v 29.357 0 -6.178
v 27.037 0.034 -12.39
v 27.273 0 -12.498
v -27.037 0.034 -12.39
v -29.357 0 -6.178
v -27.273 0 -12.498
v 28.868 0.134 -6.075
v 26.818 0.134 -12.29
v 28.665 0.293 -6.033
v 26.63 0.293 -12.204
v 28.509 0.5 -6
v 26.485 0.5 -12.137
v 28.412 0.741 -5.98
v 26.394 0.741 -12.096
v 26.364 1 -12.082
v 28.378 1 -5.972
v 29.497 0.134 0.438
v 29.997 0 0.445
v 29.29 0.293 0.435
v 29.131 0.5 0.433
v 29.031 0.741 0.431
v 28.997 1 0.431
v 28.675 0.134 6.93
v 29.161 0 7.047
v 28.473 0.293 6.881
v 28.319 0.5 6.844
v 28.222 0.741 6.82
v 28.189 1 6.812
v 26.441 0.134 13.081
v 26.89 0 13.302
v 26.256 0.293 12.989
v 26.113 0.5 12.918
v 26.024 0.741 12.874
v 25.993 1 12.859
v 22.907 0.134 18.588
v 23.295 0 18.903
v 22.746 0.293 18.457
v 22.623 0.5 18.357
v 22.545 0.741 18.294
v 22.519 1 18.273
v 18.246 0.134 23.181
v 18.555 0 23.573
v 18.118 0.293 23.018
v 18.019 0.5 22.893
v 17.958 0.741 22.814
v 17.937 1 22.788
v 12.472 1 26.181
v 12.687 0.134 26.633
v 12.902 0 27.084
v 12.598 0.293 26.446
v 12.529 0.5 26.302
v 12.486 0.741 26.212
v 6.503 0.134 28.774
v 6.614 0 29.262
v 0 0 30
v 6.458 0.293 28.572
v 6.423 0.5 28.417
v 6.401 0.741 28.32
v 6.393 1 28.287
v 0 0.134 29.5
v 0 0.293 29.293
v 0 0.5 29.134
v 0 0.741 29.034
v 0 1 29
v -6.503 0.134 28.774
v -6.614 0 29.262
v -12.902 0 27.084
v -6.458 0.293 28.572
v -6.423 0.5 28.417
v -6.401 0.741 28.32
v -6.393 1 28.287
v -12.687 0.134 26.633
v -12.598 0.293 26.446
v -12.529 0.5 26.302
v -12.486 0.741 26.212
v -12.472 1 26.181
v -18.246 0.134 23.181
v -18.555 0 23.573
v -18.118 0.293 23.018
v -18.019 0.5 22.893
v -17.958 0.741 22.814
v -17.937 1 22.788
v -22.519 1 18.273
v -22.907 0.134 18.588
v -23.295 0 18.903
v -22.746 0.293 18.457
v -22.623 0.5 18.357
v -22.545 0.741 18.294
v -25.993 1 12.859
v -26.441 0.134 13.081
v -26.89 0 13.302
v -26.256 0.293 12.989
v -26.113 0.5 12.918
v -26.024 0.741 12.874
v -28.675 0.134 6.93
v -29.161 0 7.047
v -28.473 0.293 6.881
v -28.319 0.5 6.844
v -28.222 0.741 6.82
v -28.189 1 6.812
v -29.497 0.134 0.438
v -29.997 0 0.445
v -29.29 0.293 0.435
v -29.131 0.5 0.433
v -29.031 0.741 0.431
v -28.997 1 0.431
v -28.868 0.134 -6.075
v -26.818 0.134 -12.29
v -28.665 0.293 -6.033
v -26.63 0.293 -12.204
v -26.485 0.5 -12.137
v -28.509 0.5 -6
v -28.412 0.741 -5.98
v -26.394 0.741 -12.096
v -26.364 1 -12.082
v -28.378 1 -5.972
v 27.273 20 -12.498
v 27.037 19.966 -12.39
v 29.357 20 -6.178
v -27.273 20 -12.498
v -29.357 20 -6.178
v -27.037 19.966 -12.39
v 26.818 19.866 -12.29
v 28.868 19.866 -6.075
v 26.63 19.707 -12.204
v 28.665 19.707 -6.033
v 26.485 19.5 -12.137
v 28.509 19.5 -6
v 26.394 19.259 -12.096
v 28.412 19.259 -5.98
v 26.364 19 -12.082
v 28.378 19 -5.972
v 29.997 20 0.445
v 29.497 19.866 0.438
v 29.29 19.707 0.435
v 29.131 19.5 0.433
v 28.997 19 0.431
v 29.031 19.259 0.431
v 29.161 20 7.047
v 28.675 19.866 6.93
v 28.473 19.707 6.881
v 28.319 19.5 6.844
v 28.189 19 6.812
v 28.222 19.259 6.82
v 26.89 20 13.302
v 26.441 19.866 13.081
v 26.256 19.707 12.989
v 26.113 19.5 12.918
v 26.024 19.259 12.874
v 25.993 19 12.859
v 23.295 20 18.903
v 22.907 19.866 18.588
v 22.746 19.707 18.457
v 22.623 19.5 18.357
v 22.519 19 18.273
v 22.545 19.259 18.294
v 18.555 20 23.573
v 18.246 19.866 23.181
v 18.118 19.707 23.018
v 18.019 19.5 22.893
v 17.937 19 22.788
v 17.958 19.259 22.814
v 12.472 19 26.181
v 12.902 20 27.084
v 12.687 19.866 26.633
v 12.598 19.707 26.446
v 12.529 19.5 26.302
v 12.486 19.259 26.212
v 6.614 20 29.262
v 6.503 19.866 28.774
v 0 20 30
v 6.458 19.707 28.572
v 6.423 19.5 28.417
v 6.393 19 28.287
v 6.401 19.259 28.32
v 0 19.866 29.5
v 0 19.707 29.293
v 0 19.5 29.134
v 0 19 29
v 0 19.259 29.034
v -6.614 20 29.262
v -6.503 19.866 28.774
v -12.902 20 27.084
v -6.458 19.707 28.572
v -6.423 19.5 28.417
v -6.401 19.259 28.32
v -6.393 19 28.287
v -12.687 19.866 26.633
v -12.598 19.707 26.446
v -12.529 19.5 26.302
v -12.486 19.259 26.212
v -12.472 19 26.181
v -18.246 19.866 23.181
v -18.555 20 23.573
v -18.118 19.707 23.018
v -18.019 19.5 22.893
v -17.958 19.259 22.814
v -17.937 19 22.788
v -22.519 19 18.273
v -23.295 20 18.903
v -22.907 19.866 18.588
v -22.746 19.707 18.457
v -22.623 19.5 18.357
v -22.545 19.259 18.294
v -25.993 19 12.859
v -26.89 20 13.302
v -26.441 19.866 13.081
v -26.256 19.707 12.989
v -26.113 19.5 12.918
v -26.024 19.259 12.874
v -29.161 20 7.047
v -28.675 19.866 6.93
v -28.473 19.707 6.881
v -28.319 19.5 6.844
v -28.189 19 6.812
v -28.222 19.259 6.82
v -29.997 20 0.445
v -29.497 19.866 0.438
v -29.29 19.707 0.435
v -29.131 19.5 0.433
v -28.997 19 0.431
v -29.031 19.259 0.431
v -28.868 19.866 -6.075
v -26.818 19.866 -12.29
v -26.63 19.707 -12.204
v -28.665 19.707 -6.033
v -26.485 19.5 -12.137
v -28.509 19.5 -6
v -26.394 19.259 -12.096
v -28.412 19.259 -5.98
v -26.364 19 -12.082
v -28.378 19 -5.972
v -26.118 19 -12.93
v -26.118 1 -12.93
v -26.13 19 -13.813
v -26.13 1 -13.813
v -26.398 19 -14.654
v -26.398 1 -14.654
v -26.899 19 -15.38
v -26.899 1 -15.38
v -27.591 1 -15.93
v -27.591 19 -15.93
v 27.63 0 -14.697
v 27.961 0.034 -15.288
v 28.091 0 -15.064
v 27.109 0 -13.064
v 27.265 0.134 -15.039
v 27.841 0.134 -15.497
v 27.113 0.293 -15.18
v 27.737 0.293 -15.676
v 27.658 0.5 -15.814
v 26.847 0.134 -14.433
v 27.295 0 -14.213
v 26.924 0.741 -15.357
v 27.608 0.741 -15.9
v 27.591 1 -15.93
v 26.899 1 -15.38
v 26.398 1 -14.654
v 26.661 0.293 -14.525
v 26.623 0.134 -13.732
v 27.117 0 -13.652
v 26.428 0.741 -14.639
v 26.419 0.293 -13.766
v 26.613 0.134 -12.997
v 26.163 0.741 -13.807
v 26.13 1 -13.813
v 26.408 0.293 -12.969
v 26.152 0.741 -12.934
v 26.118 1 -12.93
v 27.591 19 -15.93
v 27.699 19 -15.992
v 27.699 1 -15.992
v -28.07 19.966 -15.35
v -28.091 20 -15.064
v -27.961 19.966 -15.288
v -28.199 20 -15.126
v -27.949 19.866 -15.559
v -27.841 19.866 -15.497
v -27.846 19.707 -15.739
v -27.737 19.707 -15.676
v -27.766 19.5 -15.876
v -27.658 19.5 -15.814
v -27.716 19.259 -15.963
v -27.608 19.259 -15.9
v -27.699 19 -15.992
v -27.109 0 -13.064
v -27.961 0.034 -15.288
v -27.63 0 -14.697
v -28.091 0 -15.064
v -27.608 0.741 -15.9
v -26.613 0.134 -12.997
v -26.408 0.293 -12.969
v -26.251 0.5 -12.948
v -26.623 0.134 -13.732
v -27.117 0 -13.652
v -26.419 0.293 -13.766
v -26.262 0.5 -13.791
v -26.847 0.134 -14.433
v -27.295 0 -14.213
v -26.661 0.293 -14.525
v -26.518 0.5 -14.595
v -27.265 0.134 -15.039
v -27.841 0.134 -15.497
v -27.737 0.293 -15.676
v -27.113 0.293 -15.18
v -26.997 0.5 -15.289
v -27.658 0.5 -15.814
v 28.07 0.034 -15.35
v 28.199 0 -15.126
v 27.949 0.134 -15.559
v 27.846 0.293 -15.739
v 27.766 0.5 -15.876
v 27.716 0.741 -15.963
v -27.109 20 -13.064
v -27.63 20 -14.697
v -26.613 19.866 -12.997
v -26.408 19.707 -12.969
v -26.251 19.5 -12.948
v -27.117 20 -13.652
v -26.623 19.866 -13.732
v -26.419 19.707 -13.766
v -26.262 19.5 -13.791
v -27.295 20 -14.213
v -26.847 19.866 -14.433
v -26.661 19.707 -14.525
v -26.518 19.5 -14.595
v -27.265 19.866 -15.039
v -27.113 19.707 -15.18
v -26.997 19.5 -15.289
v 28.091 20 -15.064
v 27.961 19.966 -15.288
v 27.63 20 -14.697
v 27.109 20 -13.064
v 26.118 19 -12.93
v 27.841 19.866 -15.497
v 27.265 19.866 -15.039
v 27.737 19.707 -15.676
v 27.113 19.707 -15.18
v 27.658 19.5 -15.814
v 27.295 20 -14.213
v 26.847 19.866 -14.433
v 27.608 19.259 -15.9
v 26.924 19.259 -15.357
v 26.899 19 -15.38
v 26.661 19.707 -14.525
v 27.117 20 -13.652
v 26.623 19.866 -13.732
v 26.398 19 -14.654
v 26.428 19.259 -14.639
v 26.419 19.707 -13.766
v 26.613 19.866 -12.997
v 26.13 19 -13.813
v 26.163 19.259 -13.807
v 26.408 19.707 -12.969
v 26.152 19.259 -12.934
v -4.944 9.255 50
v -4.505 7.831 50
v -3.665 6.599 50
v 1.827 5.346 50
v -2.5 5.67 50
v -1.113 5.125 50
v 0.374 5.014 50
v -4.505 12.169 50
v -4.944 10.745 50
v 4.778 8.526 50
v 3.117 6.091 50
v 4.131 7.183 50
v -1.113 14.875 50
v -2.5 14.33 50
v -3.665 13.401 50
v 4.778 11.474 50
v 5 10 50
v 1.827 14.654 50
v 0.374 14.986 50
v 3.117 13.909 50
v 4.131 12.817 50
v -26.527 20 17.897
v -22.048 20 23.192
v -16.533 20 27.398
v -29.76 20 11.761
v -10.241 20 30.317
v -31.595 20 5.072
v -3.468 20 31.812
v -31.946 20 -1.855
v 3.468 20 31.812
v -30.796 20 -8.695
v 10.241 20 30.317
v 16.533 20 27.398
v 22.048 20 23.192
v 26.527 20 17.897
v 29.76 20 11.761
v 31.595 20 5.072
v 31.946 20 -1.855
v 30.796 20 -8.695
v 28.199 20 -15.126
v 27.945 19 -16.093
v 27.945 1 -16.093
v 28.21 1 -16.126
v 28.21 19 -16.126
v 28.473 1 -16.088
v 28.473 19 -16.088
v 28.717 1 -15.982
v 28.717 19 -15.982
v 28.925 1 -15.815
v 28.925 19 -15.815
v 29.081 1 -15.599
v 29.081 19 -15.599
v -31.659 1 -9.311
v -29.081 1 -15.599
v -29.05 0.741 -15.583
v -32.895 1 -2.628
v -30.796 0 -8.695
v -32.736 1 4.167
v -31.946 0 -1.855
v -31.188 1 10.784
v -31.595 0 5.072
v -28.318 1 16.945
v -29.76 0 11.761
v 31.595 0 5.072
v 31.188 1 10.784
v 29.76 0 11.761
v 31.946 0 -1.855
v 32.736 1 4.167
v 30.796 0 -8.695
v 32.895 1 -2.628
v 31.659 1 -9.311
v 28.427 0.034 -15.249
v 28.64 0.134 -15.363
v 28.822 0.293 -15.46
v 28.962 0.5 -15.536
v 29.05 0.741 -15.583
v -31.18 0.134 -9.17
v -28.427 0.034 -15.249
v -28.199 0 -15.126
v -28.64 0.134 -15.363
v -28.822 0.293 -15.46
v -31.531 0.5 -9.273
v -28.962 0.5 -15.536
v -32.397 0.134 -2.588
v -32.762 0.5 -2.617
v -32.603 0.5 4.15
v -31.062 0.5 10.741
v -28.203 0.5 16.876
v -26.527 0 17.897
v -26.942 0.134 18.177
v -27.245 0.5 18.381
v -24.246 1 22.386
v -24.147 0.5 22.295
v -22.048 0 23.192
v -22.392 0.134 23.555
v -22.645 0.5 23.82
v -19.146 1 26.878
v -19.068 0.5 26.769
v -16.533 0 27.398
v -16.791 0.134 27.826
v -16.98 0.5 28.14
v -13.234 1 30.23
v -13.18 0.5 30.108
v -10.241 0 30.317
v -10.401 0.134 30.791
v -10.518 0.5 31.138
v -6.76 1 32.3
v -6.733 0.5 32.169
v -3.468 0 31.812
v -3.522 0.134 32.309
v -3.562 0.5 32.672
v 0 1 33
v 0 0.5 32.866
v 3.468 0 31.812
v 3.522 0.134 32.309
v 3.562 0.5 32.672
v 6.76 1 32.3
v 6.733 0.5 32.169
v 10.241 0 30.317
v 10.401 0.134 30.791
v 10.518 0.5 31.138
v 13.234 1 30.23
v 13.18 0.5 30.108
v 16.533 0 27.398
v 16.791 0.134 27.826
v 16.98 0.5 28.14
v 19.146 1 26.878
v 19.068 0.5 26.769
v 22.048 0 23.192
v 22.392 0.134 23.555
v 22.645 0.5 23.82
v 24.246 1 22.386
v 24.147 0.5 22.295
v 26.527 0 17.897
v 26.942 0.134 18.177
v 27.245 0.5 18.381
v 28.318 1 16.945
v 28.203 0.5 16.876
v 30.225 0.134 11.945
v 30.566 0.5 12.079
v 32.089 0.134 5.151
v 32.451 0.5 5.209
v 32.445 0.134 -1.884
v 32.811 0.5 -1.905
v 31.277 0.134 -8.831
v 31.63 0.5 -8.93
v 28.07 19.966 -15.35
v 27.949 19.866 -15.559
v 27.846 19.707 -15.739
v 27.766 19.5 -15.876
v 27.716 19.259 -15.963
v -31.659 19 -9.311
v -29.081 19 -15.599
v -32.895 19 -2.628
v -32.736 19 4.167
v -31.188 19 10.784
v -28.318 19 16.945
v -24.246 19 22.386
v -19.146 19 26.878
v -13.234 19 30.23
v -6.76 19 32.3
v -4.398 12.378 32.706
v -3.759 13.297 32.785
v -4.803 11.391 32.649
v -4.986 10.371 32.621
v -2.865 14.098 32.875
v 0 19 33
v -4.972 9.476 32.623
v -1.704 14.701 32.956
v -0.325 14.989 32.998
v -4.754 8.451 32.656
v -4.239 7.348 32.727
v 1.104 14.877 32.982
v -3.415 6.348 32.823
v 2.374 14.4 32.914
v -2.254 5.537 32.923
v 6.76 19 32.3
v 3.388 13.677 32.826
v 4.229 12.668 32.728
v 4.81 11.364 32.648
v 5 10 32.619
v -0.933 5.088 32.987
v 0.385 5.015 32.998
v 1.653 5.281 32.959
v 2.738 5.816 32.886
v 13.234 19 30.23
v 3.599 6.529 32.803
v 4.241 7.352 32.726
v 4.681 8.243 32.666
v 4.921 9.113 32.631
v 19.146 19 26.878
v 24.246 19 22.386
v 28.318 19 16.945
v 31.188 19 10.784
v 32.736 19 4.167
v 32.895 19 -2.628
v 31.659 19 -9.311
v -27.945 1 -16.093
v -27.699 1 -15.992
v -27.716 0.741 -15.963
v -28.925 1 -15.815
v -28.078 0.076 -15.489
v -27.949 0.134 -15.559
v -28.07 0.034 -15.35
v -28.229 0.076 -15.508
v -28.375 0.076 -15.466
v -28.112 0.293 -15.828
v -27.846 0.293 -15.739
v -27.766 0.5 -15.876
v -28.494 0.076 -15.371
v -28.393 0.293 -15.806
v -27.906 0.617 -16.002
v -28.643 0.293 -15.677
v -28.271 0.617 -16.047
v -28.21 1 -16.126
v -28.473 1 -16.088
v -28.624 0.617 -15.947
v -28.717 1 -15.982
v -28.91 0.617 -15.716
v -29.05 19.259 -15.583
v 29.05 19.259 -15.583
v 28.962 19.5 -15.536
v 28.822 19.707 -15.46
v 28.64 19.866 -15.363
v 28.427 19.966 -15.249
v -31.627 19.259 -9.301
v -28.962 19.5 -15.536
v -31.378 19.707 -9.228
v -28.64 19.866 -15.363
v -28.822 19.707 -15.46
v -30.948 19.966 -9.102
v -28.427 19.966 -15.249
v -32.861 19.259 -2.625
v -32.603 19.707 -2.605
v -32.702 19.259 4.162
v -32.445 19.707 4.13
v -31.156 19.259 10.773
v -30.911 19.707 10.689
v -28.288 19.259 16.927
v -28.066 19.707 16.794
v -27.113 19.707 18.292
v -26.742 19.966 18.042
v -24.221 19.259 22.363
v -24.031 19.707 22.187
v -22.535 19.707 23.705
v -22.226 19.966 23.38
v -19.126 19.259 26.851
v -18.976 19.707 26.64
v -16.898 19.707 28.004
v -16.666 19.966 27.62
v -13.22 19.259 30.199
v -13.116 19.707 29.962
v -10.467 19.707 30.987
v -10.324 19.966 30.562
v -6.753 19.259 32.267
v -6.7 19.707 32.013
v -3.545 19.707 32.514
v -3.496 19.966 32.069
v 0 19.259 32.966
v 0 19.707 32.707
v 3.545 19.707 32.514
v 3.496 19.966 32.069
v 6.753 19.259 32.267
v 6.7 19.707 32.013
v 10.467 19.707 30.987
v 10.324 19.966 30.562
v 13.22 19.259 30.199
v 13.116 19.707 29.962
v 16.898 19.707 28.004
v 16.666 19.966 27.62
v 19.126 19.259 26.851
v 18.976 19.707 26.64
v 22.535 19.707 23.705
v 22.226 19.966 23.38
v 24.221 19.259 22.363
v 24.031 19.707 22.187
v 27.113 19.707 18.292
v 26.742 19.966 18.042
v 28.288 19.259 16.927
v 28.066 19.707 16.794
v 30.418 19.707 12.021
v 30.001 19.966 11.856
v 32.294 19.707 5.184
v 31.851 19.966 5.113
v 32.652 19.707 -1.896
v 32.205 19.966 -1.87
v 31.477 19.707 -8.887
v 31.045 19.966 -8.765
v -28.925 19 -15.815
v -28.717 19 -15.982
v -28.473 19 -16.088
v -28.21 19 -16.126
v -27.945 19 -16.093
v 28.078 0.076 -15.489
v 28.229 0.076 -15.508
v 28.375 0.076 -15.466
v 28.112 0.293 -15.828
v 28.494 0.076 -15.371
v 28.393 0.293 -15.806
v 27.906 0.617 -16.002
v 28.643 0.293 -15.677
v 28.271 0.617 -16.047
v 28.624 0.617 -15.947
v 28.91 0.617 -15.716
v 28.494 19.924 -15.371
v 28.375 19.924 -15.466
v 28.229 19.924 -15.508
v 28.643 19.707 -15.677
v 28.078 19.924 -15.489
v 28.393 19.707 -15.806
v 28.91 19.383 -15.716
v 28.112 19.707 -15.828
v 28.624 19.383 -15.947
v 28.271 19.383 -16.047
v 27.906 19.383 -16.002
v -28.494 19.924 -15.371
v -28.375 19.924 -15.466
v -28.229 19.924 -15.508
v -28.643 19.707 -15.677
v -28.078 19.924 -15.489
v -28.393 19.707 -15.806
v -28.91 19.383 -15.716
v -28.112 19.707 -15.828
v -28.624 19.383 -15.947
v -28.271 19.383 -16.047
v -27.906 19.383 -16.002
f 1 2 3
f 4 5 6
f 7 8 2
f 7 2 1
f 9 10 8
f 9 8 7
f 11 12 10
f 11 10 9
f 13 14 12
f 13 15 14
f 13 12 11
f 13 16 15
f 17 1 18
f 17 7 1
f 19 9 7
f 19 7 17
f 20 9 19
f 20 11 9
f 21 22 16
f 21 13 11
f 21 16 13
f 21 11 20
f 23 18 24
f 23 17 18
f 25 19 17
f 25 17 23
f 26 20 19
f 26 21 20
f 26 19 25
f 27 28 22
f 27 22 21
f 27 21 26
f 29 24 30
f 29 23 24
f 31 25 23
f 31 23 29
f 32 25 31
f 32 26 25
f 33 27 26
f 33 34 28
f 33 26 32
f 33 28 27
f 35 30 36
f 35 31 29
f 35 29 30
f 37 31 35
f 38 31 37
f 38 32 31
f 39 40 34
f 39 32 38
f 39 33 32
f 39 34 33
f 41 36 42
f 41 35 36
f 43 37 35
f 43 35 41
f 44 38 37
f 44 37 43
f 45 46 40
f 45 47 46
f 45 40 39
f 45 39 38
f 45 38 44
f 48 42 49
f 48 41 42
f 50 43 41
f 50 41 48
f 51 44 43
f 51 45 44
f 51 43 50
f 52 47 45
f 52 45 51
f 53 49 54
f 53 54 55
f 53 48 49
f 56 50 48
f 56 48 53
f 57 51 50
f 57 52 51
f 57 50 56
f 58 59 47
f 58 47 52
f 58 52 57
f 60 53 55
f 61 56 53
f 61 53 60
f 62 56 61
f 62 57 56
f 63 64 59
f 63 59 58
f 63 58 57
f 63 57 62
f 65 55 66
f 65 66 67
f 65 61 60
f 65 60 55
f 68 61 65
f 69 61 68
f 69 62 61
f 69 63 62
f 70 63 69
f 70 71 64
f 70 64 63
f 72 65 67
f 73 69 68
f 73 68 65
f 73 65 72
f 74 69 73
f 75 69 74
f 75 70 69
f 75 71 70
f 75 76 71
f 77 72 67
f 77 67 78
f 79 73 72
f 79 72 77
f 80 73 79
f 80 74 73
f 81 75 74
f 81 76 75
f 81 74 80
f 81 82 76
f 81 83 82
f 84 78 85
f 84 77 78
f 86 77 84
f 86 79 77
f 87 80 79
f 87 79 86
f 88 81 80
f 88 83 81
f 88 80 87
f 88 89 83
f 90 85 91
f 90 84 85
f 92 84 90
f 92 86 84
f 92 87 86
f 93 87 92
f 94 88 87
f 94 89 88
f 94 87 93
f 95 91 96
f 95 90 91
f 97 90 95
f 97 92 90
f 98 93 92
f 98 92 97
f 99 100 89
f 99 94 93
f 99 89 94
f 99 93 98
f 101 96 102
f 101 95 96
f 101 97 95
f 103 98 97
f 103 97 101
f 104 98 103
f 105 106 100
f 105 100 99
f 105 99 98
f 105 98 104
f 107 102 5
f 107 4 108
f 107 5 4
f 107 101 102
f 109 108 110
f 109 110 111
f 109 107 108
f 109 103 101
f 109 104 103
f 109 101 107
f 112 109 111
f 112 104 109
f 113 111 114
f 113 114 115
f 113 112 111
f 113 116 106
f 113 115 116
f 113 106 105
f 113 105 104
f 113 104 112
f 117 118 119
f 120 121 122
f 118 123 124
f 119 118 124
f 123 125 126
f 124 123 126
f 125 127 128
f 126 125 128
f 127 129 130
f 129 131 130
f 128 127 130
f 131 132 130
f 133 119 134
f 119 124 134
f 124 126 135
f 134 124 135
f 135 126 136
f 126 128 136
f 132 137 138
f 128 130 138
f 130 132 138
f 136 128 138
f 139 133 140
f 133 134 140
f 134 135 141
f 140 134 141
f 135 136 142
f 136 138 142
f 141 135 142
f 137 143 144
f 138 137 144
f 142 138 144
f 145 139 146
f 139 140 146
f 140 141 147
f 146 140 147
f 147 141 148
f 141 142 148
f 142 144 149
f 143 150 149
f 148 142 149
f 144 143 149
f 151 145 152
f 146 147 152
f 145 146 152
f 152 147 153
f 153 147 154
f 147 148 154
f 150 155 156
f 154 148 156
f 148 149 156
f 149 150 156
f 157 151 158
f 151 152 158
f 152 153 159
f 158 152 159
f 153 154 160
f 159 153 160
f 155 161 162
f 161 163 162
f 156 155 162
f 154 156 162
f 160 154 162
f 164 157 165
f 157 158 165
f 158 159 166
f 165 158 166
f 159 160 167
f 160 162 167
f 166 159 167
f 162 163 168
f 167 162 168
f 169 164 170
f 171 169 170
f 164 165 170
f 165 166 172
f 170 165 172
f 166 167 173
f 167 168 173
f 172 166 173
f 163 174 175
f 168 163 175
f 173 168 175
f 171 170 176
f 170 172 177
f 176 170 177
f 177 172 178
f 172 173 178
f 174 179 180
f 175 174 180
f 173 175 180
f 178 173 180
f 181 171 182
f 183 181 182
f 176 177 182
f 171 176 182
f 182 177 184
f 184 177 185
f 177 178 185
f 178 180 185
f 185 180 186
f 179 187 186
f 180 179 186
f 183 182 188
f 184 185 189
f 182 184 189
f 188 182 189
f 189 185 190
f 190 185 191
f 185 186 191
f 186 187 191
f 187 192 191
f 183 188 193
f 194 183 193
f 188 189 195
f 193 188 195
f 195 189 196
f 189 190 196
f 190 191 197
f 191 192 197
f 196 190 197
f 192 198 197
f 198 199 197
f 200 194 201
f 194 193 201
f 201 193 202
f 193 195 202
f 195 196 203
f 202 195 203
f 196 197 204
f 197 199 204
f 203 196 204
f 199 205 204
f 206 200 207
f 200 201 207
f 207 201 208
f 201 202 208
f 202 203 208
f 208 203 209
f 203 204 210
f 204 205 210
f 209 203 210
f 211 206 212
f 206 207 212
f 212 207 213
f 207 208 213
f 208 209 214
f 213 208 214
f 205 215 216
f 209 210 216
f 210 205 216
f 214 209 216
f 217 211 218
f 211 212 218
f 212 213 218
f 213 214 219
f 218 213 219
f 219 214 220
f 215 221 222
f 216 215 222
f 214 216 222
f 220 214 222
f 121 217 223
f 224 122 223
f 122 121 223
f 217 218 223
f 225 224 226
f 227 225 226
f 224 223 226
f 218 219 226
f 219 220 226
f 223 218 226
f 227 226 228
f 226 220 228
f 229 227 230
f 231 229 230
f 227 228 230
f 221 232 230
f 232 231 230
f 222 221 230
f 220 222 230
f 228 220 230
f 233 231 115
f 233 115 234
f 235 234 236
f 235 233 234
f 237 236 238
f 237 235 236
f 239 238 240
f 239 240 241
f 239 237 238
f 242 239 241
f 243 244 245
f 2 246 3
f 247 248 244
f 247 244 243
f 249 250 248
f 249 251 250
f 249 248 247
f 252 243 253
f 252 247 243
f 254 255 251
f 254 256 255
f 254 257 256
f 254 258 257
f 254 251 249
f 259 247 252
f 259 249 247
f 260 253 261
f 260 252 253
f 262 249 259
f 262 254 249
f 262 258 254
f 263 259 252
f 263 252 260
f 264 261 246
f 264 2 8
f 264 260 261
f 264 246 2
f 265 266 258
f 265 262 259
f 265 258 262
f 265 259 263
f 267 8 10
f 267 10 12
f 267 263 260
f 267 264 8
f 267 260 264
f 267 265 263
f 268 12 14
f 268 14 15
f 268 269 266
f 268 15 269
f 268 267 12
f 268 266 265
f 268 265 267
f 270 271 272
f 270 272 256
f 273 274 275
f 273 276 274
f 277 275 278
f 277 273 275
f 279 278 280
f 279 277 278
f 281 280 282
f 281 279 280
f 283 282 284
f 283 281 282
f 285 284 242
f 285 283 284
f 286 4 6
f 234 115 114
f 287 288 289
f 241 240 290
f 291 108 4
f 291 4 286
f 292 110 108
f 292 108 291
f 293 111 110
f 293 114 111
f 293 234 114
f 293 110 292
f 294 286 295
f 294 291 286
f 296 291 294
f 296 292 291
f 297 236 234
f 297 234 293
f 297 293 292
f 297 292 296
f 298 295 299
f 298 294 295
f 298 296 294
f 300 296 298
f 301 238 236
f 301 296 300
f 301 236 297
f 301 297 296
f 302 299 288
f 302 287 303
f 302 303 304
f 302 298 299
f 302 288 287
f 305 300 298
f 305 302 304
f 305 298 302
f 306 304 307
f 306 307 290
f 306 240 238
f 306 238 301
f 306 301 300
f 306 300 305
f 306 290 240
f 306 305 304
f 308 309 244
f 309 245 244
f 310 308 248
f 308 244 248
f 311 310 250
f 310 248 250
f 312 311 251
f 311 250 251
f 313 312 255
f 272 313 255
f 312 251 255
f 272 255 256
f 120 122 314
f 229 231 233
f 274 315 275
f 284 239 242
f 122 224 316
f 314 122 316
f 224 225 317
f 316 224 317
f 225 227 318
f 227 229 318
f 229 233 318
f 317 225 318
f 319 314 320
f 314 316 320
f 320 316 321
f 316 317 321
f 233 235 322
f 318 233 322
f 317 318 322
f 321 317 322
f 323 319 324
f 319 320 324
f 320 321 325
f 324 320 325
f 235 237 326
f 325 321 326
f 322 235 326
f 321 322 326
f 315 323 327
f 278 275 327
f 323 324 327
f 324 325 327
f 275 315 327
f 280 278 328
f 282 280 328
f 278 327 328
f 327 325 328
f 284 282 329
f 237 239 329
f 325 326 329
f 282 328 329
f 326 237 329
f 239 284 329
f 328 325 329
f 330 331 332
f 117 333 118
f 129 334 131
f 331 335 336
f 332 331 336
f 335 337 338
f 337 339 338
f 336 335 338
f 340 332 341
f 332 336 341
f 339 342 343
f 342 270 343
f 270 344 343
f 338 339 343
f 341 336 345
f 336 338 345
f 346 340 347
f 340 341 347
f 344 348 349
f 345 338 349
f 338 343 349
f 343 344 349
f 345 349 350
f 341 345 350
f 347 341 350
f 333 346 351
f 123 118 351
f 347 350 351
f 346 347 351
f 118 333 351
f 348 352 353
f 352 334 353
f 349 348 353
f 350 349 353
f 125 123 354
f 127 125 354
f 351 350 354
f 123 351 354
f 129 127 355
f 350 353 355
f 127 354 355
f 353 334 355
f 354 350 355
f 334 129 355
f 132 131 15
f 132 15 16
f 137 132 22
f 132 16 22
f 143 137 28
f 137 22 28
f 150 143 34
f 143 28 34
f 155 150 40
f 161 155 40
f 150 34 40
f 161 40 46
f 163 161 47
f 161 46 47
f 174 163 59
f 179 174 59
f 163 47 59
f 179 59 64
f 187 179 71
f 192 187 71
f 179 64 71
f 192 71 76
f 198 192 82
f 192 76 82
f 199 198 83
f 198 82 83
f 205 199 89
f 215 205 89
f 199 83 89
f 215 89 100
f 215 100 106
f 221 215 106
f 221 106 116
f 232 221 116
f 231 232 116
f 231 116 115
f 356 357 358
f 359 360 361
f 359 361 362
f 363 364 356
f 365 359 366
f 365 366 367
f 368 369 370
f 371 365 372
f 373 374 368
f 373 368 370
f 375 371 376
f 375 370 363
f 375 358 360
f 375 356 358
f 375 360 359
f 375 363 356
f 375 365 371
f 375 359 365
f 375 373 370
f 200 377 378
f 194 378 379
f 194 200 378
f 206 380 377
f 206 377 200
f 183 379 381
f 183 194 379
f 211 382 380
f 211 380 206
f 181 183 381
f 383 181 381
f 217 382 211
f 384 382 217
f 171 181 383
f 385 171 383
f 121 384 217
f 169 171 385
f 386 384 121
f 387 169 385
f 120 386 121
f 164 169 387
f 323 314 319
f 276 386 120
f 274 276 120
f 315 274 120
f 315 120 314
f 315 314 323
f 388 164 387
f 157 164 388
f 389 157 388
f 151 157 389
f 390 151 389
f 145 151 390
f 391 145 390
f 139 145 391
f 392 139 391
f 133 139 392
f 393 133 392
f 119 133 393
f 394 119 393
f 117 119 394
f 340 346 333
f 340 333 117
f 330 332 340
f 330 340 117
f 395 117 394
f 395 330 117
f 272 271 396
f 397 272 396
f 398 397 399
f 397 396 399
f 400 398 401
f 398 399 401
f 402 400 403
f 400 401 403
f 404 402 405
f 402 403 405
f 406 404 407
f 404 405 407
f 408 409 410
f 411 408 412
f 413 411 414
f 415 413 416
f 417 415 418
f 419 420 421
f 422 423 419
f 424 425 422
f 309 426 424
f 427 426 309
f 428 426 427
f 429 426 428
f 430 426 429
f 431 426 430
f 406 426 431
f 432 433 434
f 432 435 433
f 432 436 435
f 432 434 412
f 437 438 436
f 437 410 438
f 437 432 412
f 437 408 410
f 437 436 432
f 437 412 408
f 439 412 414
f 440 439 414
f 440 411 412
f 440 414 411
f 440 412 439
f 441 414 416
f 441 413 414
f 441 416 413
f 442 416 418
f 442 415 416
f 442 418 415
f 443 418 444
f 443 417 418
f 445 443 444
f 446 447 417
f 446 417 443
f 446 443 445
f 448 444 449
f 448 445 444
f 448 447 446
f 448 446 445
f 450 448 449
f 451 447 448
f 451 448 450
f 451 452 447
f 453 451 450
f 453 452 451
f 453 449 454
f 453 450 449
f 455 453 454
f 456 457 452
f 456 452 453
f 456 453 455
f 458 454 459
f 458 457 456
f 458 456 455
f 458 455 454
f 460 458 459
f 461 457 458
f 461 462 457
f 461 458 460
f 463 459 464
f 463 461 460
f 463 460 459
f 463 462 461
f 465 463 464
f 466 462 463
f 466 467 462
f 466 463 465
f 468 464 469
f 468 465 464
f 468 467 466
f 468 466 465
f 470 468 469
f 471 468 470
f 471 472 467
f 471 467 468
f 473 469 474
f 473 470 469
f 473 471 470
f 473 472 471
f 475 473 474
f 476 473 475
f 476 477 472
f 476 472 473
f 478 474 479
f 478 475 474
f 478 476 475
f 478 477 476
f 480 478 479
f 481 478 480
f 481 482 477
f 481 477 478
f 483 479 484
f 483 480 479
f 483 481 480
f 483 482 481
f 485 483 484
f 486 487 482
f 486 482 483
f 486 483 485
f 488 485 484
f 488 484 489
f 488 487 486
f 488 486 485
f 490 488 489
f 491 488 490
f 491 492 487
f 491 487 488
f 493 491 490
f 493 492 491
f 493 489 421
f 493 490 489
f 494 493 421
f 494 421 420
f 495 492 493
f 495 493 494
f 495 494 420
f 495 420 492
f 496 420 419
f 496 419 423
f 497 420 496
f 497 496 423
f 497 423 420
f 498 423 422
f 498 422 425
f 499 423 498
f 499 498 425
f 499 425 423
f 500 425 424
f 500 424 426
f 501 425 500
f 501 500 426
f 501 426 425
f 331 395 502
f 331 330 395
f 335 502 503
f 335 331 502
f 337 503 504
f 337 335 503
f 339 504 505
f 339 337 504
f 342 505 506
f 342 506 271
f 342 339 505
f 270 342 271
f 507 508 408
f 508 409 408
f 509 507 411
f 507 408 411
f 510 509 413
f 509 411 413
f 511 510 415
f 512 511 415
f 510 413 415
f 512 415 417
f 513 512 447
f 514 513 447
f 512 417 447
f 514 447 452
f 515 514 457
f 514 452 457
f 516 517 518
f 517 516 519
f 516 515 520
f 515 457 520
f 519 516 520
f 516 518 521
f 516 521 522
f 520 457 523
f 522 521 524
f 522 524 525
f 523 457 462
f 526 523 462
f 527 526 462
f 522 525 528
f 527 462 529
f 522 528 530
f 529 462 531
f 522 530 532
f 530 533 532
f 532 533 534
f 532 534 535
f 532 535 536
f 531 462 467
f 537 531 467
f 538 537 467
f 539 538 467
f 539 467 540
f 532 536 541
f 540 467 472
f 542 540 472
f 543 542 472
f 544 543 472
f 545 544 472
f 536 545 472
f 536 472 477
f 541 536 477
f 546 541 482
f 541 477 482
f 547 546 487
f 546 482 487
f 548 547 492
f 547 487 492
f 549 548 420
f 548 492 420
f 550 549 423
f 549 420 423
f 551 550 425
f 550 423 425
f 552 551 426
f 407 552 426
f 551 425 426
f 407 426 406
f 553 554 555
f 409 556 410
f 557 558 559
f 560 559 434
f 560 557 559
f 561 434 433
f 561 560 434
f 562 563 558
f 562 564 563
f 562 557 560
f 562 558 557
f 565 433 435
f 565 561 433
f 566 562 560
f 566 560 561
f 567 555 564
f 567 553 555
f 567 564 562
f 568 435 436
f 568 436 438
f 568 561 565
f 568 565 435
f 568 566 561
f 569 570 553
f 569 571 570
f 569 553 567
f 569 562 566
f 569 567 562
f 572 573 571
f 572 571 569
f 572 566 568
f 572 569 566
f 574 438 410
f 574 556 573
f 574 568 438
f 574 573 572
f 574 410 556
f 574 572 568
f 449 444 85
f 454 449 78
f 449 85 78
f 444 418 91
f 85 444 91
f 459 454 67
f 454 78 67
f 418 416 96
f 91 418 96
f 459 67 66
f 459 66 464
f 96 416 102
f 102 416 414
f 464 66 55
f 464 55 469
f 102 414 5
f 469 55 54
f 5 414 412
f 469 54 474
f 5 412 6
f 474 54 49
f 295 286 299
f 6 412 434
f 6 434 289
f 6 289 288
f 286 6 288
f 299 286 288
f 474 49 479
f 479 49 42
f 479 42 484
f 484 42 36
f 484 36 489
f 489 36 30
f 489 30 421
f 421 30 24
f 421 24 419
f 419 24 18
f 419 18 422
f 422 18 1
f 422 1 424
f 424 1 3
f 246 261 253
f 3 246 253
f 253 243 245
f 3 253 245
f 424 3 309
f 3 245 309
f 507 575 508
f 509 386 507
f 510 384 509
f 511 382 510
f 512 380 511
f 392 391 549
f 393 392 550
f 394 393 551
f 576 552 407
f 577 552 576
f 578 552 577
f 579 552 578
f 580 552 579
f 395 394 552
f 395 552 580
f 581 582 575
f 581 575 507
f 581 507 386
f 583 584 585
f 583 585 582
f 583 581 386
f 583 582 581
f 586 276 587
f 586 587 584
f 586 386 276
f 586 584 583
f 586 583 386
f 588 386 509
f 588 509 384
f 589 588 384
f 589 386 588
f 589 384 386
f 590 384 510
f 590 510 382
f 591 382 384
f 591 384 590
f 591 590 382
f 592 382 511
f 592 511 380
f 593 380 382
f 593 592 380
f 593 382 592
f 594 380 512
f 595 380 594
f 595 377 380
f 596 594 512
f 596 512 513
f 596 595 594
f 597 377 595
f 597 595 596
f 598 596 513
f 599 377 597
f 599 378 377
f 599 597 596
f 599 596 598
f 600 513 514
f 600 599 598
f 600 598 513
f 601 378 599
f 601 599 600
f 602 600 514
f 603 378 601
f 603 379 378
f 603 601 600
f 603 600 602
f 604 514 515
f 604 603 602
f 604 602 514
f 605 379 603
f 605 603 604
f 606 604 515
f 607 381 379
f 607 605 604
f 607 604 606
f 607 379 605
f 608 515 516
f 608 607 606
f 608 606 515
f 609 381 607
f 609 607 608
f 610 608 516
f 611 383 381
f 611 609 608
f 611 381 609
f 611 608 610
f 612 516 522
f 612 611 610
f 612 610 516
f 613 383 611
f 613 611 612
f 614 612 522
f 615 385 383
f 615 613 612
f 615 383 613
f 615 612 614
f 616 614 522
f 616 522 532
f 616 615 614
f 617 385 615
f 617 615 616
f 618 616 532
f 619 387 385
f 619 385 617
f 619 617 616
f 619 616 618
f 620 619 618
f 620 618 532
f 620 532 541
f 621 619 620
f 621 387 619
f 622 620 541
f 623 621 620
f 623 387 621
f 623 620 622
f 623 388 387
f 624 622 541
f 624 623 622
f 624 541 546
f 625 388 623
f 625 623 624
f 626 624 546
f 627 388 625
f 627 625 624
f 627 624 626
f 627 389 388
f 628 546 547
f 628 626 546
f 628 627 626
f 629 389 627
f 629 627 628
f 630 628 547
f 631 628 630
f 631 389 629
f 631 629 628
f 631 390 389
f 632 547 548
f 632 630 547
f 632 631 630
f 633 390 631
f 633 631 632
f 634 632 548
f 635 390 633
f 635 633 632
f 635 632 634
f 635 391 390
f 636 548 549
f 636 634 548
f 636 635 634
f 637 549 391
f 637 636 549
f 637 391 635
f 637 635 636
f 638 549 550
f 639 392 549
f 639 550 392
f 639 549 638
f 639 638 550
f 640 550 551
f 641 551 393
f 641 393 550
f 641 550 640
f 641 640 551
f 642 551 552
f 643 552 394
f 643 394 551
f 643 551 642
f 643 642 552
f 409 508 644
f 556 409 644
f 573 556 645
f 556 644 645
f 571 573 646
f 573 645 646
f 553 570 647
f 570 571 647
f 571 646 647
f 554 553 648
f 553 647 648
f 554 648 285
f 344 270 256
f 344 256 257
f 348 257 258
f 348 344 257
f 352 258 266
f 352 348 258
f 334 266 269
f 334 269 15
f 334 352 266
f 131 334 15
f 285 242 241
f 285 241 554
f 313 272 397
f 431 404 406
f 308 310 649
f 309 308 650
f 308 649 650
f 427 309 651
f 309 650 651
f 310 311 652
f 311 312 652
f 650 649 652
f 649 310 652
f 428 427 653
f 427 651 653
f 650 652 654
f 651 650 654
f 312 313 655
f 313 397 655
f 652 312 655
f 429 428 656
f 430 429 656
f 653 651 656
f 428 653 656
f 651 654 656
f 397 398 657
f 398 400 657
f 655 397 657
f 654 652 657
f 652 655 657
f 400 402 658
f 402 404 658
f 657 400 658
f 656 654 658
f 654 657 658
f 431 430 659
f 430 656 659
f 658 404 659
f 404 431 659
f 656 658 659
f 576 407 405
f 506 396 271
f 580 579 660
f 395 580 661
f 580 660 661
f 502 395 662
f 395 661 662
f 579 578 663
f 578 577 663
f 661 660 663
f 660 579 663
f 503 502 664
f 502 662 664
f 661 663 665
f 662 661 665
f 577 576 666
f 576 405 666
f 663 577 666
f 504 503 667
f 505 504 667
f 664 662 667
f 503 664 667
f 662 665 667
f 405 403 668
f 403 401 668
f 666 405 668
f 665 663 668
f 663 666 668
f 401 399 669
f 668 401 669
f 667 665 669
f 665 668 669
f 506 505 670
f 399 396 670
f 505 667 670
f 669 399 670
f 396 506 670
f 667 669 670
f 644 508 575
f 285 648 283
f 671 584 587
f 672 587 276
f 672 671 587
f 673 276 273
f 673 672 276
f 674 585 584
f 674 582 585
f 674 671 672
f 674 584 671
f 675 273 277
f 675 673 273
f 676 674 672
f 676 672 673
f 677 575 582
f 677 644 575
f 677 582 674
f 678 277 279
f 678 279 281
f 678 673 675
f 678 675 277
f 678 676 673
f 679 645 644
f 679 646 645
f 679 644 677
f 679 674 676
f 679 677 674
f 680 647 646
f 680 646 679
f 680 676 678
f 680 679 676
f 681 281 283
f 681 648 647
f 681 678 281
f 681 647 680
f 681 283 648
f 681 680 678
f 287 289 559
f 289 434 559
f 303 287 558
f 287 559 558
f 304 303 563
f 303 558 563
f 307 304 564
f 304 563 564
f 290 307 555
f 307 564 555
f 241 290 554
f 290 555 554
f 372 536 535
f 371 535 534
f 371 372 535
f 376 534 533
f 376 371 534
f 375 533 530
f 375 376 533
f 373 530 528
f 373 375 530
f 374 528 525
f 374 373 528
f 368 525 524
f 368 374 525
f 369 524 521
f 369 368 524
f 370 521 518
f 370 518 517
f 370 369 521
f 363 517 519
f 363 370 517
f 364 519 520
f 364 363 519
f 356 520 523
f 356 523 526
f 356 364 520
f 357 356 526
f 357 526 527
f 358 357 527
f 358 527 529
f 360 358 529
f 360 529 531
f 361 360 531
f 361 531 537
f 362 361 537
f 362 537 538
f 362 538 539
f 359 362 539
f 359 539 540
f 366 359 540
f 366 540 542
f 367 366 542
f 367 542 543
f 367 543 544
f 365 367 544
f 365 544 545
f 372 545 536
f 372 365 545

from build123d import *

# Parameters (mm, degrees)
EXTRUIR1_DEPTH      = 20
EXTRUIR2_REACH      = 102.774
EXTRUIR2_END_RADIUS = 33
EXTRUIR2_START      = 50
CROQUIS2_R          = 5
REDONDEO1_R         = 3
REDONDEO2_R         = 1


with BuildPart() as part:
    # Croquis1 → Extruir1 (new body)
    with BuildSketch(Plane(origin=(0, 0, 0), x_dir=(1, 0, 0), z_dir=(0, 1, 0))):
        with BuildLine():
            Line((28.578838325, 16.5), (25.11473671, 14.5))
            ThreePointArc((25.11473671, 14.5), (0, -29), (-25.11473671, 14.5))
            Line((-25.11473671, 14.5), (-28.578838325, 16.5))
            ThreePointArc((-28.578838325, 16.5), (0, -33), (28.578838325, 16.5))
        make_face()
    extrude(amount=EXTRUIR1_DEPTH)

    # Extruir2: up to this cylinder (the profile starts outside it)
    extruir2_end = Plane(origin=(0, 10, 0), z_dir=(0, -1, 0)) * Cylinder(EXTRUIR2_END_RADIUS, 272.548, mode=Mode.PRIVATE)
    # Croquis2 → Extruir2 (add, up to the surface)
    with BuildSketch(Plane.XY.offset(EXTRUIR2_START), mode=Mode.PRIVATE) as extruir2_sk1:
        with Locations((0, 10)):
            Circle(CROQUIS2_R)
    extruir2_tool1 = extrude(extruir2_sk1.sketch, amount=-EXTRUIR2_REACH, mode=Mode.PRIVATE) - extruir2_end
    add(extruir2_tool1.solids().sort_by_distance((0, 10, 50))[0])

    # Redondeo1
    redondeo1_edges = [part.edges().sort_by_distance(p)[0] for p in [
        (25.11473671, 10, -14.5),
        (-25.11473671, 10, -14.5),
    ]]
    fillet(redondeo1_edges, radius=REDONDEO1_R)

    # Redondeo2
    redondeo2_edges = [part.edges().sort_by_distance(p)[0] for p in [
        (0, 20, 33),
        (-28.084798824, 0, -16.214766161),
        (-28.084798824, 20, -16.214766161),
        (0, 0, 29),
        (28.084798824, 0, -16.214766161),
        (26.232610791, 0, -14.243040978),
        (-26.232610791, 0, -14.243040978),
        (0, 20, 29),
        (28.084798824, 20, -16.214766161),
        (26.232610791, 20, -14.243040978),
        (-26.232610791, 20, -14.243040978),
        (0, 0, 33),
        (28.578838325, 10, -16.5),
        (-28.578838325, 10, -16.5),
    ]]
    fillet(redondeo2_edges, radius=REDONDEO2_R)


solid = part.part
